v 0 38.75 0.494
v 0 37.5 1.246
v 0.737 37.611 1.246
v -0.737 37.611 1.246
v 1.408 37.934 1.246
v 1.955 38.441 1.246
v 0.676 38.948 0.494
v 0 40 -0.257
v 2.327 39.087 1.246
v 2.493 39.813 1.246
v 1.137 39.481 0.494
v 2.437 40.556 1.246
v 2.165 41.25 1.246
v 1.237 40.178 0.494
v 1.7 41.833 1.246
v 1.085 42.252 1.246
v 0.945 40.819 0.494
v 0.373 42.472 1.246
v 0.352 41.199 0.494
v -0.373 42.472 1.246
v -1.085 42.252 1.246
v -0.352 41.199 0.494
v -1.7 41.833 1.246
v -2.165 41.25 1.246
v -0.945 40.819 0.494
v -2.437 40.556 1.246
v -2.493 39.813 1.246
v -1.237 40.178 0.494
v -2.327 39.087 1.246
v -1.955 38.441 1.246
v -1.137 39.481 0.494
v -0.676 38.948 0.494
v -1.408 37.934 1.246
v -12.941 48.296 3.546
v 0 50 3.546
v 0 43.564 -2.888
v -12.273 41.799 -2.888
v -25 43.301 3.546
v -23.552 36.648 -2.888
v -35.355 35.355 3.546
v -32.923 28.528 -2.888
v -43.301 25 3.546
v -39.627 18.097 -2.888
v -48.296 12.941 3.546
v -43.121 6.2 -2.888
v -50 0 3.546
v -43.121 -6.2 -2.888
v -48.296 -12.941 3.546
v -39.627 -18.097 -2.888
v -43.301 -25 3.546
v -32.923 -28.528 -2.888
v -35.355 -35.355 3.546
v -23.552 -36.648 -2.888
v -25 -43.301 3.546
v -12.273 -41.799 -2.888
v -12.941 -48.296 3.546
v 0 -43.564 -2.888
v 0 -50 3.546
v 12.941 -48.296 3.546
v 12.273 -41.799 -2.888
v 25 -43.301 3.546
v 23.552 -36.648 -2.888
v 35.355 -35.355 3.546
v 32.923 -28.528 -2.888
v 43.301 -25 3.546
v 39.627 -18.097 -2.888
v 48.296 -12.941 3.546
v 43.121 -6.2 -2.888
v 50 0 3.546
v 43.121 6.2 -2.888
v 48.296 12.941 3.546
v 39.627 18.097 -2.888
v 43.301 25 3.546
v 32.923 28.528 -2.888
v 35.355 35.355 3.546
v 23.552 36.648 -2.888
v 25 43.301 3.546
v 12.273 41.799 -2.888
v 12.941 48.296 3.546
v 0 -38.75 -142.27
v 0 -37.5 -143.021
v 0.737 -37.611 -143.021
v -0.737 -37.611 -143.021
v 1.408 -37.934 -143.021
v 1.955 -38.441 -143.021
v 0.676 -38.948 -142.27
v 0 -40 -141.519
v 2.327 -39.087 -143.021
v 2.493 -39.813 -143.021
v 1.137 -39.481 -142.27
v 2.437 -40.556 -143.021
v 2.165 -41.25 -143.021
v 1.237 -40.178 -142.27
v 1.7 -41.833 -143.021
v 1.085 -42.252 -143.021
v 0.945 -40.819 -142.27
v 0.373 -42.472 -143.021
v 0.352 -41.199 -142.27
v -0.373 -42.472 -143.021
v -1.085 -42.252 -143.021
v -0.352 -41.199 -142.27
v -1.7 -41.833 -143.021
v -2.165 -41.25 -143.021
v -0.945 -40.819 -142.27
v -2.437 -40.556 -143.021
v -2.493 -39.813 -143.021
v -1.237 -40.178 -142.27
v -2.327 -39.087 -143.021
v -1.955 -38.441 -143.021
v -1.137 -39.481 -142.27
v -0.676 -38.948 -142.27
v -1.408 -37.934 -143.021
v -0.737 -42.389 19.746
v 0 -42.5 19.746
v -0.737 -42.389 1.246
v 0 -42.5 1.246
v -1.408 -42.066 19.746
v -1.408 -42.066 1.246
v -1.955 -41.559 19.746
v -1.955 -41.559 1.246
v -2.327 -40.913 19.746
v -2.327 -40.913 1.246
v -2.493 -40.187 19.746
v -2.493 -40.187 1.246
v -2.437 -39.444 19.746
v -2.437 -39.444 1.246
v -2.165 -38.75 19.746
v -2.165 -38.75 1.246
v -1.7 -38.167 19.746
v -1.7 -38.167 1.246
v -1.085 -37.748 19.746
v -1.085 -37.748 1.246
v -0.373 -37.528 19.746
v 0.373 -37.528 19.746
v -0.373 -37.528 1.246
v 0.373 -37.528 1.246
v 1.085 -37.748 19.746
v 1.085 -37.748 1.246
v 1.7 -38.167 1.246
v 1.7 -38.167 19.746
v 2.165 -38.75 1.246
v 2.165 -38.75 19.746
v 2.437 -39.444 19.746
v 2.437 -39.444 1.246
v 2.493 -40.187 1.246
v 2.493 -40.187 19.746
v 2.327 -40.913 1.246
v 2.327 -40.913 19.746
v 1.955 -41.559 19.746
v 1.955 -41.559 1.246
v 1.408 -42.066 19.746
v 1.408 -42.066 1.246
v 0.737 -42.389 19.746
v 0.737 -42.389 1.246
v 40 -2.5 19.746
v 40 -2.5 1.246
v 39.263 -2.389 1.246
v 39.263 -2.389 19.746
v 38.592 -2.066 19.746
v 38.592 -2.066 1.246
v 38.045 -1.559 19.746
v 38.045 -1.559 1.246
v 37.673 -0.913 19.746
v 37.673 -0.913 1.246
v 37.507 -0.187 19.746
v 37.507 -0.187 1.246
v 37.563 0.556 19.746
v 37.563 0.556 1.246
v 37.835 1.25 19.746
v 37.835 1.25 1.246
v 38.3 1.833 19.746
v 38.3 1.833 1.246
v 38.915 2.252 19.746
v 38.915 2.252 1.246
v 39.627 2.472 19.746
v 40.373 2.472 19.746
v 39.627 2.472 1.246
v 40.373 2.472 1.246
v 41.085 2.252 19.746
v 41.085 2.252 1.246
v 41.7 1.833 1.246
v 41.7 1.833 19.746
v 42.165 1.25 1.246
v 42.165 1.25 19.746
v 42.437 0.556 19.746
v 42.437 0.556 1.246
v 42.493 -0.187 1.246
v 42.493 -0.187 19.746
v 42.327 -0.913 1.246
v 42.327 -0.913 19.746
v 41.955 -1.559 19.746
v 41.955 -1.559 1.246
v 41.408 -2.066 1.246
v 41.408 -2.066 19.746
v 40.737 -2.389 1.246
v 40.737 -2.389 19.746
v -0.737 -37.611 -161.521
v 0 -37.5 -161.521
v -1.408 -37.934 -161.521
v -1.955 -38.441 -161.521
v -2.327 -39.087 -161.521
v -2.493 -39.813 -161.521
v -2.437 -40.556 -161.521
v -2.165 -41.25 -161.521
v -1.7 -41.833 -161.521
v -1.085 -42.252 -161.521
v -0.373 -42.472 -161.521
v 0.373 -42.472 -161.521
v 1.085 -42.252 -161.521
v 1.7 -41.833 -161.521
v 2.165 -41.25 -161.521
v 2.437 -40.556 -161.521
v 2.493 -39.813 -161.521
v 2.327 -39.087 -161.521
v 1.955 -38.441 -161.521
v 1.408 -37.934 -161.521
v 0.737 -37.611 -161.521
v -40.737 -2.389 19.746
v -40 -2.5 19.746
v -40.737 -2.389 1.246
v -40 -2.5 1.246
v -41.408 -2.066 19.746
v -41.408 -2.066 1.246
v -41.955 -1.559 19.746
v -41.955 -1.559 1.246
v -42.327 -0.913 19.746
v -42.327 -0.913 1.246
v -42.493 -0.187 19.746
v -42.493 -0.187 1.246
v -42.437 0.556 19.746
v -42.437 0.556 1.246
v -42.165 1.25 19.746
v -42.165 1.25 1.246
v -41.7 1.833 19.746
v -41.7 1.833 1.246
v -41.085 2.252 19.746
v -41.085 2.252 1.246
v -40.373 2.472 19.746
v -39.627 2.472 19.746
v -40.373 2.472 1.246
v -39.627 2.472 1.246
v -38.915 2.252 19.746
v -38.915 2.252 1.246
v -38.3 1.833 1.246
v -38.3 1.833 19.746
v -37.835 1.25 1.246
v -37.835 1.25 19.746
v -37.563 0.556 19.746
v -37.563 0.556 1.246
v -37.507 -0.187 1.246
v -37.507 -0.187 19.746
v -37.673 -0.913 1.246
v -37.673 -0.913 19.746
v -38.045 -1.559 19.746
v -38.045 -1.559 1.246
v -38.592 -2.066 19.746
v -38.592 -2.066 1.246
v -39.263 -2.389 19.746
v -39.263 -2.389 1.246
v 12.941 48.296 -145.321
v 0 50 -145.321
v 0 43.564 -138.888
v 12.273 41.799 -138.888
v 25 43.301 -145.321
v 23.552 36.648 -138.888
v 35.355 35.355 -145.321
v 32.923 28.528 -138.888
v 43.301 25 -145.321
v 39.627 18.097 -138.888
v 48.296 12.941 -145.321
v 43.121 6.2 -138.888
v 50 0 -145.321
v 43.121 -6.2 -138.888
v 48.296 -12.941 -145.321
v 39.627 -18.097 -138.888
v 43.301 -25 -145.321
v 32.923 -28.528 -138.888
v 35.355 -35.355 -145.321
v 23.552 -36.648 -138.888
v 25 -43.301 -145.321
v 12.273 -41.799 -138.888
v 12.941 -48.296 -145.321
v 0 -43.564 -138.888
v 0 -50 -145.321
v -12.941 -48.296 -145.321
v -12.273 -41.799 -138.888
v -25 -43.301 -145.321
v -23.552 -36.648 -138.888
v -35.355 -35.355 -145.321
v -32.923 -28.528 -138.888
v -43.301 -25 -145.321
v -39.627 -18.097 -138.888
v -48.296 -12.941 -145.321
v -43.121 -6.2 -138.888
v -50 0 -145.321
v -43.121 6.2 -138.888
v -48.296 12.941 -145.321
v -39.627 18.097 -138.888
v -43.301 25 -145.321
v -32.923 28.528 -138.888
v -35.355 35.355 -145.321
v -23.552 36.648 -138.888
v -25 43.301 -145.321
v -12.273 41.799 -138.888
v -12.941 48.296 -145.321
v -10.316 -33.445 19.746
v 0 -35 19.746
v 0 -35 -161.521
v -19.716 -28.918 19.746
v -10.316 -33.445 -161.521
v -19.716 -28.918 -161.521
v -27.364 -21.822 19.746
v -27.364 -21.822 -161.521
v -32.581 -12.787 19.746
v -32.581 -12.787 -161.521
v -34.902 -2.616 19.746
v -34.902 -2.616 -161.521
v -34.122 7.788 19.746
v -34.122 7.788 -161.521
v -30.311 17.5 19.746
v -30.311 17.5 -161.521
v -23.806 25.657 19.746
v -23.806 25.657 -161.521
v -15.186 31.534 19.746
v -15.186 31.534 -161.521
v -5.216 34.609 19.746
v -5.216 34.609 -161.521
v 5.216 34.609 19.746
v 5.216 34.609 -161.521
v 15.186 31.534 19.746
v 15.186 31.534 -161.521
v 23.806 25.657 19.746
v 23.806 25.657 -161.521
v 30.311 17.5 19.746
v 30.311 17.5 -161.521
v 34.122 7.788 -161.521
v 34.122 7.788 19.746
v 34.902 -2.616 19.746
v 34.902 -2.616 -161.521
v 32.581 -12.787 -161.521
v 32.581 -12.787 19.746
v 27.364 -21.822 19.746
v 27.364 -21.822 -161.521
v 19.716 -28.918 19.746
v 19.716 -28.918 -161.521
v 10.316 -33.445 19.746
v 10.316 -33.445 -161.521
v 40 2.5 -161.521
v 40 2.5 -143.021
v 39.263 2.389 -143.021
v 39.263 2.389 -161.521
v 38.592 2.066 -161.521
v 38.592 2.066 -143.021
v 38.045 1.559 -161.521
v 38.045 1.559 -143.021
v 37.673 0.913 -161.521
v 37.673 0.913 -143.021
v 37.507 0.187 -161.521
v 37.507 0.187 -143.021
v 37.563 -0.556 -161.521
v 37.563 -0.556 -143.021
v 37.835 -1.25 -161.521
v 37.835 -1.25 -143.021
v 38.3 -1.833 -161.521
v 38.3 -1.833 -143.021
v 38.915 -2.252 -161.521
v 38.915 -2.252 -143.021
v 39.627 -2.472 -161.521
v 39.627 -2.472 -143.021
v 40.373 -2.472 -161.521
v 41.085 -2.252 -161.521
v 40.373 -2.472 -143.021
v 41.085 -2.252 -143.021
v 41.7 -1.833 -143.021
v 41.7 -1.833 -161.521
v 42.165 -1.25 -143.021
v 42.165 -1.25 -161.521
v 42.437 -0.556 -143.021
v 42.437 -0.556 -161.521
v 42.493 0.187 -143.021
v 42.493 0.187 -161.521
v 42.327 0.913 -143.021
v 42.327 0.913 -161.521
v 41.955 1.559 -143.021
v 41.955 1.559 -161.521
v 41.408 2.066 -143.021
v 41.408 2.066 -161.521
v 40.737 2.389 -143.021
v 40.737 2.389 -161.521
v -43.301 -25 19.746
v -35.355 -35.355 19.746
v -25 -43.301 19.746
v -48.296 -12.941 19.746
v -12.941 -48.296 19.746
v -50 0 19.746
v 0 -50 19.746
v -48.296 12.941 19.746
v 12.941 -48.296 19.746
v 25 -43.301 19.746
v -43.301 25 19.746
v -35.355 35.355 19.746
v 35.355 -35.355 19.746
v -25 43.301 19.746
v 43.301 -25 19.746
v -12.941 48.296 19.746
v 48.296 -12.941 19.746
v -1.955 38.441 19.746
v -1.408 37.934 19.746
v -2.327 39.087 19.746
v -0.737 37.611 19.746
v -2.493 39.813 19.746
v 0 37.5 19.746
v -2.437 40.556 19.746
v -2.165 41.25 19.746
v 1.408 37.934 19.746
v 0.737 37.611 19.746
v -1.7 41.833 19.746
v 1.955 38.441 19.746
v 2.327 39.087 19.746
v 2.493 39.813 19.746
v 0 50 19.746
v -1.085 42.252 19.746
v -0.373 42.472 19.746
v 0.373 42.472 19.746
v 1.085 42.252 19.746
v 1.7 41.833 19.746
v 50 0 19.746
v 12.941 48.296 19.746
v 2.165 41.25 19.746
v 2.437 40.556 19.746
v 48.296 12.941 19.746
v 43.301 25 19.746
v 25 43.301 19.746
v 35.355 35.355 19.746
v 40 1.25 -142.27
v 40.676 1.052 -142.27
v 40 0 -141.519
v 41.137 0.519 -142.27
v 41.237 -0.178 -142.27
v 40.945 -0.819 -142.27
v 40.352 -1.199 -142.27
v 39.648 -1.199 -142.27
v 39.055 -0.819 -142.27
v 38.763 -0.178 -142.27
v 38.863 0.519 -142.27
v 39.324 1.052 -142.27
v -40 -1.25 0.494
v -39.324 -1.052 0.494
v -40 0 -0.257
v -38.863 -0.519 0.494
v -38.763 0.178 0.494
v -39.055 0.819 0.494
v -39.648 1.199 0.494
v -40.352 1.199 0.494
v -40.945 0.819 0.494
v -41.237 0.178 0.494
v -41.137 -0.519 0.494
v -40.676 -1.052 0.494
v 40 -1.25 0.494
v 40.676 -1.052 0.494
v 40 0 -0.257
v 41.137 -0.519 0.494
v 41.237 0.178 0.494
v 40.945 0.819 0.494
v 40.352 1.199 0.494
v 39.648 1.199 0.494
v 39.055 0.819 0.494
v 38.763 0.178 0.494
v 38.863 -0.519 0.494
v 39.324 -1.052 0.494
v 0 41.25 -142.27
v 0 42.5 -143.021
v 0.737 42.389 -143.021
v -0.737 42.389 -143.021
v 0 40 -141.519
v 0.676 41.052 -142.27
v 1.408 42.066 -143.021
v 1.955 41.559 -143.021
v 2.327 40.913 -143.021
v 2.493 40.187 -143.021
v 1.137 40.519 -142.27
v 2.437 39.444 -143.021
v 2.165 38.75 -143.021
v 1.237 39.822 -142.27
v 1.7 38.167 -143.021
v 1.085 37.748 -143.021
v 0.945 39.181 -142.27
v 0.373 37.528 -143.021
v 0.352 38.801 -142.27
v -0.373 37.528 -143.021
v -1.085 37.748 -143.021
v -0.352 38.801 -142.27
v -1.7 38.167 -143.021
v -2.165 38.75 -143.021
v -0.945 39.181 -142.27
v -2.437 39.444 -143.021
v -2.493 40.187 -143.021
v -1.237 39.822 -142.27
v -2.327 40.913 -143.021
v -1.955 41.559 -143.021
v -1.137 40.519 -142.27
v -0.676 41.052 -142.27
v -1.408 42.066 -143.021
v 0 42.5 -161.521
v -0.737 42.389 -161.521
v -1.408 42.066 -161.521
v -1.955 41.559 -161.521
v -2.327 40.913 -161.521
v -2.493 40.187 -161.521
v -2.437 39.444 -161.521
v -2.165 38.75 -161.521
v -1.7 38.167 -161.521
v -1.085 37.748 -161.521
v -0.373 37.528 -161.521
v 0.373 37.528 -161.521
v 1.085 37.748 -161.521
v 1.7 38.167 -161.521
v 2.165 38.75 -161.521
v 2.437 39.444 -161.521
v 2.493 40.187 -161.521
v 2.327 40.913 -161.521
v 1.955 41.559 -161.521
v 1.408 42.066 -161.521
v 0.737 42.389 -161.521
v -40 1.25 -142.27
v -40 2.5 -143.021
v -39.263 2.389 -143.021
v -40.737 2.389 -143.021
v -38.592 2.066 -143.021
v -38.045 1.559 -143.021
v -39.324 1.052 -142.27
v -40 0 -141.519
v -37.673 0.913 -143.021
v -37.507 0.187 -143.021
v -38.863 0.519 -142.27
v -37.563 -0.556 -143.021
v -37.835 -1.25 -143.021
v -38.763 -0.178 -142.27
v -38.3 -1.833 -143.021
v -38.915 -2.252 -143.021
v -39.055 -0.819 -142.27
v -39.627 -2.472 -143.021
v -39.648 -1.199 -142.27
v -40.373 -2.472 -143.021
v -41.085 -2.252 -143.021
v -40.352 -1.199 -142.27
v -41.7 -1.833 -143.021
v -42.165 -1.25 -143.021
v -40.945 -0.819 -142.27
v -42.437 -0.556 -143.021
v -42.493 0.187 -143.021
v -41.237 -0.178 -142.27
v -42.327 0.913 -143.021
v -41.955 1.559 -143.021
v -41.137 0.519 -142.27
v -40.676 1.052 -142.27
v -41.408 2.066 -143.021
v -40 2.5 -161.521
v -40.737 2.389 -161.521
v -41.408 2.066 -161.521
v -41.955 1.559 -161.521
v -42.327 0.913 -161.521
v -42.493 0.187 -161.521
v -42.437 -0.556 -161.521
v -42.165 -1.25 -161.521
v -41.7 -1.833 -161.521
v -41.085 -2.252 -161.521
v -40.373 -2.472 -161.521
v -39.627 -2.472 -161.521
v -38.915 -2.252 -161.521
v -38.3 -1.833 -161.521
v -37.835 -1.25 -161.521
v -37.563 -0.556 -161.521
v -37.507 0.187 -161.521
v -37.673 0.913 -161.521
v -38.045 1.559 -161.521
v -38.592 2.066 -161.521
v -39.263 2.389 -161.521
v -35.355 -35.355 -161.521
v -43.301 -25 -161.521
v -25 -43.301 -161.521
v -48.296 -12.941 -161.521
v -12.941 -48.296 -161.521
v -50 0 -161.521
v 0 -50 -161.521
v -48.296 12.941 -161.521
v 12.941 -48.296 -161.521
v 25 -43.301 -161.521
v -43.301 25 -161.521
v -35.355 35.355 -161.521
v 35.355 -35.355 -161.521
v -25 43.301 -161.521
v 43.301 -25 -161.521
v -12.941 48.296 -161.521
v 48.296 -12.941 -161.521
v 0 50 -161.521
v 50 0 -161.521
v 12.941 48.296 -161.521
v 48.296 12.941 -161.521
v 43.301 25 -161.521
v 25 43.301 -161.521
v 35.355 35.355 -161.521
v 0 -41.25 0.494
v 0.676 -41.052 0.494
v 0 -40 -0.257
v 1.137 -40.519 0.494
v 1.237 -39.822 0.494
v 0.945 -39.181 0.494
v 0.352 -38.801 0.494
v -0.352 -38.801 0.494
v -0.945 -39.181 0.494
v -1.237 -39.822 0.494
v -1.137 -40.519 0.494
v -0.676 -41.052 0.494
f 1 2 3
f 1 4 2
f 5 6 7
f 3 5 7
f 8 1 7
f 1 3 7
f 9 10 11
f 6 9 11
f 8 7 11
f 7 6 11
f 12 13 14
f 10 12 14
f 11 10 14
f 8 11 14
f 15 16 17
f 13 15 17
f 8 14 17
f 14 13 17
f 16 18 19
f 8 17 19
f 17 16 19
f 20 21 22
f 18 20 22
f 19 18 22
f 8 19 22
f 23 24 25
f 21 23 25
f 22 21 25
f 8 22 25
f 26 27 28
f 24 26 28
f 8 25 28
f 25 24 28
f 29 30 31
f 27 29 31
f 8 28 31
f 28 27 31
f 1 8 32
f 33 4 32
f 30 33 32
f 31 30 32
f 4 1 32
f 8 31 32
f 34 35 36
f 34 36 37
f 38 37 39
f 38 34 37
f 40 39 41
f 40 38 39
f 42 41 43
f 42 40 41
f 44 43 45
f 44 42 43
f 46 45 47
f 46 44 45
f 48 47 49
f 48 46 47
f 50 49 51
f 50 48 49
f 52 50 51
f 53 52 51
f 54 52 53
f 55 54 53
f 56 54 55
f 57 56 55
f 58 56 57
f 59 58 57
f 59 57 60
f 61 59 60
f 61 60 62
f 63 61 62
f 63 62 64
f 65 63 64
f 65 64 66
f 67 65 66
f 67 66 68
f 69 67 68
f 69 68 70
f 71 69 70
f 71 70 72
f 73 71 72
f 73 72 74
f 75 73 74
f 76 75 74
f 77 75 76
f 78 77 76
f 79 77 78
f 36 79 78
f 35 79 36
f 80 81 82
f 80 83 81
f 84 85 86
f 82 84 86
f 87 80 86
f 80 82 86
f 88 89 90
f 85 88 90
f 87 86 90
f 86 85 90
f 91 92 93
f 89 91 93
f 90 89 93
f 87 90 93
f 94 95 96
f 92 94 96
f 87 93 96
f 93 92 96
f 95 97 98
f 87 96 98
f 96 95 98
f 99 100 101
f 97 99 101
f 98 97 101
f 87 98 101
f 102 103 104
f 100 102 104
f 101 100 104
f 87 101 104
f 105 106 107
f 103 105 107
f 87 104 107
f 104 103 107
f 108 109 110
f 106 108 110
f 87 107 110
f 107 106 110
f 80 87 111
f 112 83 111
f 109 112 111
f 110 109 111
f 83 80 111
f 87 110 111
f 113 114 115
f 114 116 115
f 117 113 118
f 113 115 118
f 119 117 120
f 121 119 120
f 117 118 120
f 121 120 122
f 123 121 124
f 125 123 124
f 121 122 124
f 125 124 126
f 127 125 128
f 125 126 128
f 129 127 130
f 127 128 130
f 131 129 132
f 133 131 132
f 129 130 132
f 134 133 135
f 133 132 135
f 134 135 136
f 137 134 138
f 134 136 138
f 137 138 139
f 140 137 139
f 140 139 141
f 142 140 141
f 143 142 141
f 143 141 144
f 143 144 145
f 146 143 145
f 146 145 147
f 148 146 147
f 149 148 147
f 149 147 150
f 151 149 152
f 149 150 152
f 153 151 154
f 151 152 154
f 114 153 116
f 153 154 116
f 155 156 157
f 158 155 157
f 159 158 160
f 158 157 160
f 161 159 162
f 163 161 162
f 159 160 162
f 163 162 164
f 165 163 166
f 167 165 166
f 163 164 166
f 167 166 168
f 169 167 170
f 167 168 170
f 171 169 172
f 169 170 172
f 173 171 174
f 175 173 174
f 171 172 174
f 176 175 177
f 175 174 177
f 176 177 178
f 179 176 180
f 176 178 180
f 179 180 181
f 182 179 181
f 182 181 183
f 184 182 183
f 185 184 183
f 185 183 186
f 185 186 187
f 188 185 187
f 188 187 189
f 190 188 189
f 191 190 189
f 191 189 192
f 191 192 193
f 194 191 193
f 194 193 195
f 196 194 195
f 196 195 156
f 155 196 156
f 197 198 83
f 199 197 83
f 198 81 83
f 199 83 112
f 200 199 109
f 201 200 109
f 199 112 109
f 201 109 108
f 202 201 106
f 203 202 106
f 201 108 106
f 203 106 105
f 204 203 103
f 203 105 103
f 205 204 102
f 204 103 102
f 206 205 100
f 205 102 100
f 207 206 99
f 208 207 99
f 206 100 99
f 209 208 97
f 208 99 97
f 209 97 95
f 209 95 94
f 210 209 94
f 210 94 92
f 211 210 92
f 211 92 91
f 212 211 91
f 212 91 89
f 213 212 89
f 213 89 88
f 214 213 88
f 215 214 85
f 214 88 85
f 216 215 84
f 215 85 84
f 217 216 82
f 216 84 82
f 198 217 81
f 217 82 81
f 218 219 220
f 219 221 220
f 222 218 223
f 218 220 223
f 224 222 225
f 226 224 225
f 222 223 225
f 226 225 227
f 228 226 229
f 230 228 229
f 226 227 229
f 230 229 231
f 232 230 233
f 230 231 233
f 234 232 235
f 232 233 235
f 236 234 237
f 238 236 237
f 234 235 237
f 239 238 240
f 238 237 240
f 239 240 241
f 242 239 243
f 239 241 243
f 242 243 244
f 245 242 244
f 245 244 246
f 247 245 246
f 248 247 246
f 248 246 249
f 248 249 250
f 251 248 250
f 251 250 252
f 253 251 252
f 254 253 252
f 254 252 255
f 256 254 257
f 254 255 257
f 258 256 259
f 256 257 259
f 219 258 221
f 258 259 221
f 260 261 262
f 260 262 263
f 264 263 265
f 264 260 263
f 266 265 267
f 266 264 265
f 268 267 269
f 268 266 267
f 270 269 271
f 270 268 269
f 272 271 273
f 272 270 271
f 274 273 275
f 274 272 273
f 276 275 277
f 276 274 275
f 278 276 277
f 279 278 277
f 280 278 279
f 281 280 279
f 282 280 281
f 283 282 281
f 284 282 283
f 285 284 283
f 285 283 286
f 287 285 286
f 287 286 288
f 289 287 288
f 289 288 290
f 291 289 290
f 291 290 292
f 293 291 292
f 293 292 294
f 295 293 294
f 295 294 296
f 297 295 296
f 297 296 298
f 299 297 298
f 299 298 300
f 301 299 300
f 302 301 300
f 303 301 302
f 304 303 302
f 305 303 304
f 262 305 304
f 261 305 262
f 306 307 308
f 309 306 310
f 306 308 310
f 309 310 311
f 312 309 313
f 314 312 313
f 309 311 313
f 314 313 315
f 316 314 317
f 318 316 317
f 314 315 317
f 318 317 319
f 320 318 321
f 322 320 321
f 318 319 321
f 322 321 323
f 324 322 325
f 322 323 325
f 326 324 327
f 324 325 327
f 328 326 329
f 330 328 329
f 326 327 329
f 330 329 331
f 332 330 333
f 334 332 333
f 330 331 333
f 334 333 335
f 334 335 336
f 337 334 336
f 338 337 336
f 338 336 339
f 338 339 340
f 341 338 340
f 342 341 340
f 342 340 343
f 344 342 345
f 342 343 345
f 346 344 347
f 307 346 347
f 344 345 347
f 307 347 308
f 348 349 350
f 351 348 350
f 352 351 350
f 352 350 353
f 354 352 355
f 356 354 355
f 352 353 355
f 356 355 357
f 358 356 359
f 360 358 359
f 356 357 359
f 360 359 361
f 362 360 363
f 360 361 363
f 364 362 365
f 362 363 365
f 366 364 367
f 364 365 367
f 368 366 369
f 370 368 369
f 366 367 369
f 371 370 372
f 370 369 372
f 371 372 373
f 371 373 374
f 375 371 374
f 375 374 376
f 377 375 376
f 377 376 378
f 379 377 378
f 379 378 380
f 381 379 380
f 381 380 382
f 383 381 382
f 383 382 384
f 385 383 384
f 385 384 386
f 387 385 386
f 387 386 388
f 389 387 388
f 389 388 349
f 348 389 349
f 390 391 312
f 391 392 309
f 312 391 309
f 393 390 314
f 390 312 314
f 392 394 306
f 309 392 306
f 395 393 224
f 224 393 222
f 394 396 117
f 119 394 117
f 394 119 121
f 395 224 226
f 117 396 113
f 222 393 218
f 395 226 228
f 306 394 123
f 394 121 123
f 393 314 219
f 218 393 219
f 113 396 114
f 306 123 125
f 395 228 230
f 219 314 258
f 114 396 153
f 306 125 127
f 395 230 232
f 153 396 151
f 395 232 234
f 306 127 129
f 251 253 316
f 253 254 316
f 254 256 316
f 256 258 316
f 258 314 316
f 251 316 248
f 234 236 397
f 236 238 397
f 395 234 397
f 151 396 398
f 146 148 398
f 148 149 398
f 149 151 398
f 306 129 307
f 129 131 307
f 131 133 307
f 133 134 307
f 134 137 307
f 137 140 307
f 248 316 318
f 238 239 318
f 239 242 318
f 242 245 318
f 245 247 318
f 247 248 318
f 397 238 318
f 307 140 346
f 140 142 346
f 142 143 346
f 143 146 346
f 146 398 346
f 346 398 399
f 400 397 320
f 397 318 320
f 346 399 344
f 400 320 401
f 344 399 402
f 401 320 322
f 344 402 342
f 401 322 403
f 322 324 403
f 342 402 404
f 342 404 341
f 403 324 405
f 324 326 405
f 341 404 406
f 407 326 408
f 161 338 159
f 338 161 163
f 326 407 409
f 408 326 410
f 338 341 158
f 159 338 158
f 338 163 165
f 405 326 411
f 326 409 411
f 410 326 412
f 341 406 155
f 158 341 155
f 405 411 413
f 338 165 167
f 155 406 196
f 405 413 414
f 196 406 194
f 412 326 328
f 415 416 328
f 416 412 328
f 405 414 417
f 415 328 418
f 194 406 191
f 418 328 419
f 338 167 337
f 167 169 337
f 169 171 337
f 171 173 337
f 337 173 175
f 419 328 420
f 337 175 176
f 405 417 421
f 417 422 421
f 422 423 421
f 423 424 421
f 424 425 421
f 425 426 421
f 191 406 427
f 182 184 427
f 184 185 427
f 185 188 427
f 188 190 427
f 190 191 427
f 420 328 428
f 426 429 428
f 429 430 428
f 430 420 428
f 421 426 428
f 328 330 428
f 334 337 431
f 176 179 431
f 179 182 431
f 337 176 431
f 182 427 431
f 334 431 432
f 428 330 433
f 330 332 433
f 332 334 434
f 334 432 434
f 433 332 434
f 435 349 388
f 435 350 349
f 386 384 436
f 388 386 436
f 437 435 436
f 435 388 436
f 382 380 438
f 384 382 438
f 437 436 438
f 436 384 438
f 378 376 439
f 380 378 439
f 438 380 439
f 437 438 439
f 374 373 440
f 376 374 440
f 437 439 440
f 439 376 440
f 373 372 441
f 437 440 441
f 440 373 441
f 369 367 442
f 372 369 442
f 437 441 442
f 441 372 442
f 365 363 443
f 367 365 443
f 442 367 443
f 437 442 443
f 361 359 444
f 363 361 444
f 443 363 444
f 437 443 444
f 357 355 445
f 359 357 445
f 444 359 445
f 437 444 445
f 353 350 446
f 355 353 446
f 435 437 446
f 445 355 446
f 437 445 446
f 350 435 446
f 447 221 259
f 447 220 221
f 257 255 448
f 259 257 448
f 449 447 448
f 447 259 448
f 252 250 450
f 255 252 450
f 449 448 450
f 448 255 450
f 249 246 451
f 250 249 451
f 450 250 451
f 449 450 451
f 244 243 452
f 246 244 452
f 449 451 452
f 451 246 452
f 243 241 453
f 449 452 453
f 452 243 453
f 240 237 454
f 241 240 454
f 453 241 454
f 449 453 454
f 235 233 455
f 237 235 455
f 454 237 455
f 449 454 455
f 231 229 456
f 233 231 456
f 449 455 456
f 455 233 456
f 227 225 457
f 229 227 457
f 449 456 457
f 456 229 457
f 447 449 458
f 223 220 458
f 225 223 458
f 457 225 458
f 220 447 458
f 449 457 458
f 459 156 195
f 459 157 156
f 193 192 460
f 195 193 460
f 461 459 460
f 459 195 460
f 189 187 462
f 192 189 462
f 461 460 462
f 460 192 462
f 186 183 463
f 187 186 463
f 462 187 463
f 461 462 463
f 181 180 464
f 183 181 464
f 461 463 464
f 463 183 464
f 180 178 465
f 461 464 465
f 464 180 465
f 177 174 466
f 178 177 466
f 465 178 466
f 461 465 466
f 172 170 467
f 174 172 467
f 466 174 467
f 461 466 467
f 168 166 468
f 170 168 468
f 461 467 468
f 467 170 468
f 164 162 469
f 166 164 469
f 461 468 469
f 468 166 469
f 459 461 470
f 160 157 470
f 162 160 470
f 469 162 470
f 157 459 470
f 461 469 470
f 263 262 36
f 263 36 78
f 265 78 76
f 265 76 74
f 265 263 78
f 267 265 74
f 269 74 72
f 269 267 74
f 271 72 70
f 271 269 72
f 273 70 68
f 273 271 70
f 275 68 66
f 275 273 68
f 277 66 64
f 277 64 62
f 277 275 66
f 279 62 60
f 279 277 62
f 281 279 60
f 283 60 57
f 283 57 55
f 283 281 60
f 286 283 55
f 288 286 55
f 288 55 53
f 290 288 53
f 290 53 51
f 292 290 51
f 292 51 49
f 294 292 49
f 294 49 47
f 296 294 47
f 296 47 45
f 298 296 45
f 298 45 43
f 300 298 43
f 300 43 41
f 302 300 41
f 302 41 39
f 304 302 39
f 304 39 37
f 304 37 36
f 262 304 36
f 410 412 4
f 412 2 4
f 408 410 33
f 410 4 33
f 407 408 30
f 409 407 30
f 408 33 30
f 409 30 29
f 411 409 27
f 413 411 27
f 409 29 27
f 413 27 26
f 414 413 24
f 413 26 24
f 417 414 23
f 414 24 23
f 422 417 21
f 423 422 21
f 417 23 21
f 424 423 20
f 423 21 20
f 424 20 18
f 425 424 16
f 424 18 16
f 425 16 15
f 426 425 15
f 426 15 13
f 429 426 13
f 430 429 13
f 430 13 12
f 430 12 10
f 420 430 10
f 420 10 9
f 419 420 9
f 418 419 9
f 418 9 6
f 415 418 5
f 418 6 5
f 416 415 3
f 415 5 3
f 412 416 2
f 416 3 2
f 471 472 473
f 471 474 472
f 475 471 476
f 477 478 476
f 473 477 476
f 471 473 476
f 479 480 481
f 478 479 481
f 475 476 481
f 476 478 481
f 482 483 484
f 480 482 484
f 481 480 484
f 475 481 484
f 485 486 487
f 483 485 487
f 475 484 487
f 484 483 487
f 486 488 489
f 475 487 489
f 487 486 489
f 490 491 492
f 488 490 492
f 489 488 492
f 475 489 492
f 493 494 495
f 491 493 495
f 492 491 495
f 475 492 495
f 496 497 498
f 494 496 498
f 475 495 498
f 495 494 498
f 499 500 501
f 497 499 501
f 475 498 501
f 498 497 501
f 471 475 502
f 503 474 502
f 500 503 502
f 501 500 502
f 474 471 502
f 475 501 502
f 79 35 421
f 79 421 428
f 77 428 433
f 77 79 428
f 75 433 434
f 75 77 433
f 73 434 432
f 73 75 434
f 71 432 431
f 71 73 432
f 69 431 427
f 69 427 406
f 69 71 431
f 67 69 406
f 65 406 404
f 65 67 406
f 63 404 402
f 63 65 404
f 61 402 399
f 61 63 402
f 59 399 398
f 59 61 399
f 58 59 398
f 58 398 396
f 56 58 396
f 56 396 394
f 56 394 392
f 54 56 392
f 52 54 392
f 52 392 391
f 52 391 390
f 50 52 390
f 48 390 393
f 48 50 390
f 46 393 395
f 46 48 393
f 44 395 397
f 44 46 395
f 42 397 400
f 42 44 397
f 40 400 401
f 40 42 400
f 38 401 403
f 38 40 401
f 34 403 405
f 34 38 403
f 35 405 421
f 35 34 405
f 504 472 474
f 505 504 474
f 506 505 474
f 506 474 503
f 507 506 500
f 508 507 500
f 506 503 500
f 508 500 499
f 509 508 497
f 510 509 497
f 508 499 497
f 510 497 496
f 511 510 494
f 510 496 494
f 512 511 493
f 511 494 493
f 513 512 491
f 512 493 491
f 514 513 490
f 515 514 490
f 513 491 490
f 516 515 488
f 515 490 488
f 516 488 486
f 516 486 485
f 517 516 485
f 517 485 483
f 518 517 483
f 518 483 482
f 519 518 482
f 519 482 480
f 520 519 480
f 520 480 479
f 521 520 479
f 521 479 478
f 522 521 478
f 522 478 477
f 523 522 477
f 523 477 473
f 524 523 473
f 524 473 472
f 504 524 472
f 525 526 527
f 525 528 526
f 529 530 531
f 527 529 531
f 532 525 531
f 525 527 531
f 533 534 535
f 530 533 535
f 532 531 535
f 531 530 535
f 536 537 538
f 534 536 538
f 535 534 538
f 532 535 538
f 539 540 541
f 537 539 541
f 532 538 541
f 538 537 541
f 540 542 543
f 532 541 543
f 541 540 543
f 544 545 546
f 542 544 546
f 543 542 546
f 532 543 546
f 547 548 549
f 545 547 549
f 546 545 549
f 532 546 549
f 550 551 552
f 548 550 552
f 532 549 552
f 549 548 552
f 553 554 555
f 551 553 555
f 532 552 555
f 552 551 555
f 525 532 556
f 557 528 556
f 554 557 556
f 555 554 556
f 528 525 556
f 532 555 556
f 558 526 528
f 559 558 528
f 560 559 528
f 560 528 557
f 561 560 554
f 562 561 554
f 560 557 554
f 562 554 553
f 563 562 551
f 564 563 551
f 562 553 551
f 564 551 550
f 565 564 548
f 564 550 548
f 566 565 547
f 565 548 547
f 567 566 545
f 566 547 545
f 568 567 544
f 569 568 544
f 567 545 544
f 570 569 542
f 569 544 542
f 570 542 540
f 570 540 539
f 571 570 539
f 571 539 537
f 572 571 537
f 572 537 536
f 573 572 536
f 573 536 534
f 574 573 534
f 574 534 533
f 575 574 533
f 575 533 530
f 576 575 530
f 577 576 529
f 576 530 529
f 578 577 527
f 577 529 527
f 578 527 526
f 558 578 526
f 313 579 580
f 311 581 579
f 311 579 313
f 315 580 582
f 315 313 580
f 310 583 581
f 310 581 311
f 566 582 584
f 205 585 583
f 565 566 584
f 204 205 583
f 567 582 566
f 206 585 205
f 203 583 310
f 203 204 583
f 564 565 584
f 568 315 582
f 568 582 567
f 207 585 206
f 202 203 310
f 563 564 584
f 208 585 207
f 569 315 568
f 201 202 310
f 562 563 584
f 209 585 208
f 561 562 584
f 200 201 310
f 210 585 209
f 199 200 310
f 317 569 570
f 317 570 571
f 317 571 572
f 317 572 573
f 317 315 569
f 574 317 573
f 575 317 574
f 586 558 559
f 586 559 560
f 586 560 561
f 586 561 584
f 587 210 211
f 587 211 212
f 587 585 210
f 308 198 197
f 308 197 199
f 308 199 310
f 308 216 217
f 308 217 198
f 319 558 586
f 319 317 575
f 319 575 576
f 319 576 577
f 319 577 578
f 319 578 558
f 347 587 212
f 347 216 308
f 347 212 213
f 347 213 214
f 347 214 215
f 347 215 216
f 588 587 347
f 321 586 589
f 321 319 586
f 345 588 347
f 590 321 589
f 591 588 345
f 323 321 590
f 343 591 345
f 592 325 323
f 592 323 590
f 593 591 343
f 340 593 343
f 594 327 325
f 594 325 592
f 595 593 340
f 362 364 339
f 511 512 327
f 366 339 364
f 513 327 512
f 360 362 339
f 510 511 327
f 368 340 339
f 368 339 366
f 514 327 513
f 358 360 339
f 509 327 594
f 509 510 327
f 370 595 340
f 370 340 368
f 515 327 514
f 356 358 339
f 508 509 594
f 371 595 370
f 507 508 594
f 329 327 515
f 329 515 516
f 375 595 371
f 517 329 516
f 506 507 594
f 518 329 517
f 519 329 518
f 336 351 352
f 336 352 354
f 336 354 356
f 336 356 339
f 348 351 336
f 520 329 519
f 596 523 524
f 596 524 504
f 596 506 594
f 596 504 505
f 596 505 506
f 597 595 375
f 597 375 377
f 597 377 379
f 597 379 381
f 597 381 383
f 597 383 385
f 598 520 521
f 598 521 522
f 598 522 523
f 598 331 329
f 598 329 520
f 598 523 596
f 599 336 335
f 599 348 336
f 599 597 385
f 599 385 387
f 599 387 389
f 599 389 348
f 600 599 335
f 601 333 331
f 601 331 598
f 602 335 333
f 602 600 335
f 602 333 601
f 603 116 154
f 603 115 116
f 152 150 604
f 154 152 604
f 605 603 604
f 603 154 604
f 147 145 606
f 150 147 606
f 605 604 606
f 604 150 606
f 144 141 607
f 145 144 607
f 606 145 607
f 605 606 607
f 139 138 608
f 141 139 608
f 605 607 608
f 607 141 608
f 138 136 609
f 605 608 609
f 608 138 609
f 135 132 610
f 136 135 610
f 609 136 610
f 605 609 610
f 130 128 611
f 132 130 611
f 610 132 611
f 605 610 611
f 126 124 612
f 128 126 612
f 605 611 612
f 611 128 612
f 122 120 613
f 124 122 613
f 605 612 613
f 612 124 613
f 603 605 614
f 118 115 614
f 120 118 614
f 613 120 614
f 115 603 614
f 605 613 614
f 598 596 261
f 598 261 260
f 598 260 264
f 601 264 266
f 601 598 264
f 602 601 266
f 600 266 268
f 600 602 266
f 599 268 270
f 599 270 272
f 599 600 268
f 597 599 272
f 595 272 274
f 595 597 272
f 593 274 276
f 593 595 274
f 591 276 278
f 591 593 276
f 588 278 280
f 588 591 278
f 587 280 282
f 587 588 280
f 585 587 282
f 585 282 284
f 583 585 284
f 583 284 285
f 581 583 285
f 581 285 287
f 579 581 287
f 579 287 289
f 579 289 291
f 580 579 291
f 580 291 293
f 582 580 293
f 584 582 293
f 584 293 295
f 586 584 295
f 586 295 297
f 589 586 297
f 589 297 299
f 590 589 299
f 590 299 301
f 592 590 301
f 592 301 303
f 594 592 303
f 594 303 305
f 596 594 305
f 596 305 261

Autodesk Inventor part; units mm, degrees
ref_plane "YZ Plane" through (0, 0, 0) normal (1, 0, 0) x (0, 1, 0)
ref_plane "XZ Plane" through (0, 0, 0) normal (0, 1, 0) x (-1, 0, 0)
ref_plane "XY Plane" through (0, 0, 0) normal (0, 0, 1) x (1, 0, 0)
sketch "Szkic1" plane through (0, 0, 0) normal (1, 0, 0) x (0, 1, 0)
  point P0 (0, 0)
sketch "Szkic2" plane through (0, 0, 0) normal (1, 0, 0) x (0, 1, 0)
  point P0 (0, 0)
sketch "Szkic3" plane through (0, 0, 0) normal (1, 0, 0) x (0, 1, 0)
  line L0 (0, 19.7455) -> (50, 19.7455)
  line L1 (50, 19.7455) -> (50, 3.5455)
  line L2 (50, 3.5455) -> (43.564, -2.8878)
  line L3 (43.564, -2.8878) -> (43.564, -138.8878)
  line L4 (43.564, -138.8878) -> (50, -145.3212)
  line L5 (50, -145.3212) -> (50, -161.5212)
  line L6 (50, -161.5212) -> (0, -161.5212)
  line L7 (0, 19.7455) -> (0, -161.5212)
  point P0 (0, 0)
  dimension "d0" = 50
  dimension "d1" = 16.2
  dimension "d2" = 9.1
  dimension "d3" = 136
  dimension "d4" = 9.1
  dimension "d5" = 16.2
revolve "Obrót1" add sketch "Szkic3" angle 360 about axis through (0, 0, 19.7455) along (0, 0, -1)
sketch "Szkic4" plane through (0, 0, -161.5212) normal (0, 0, -1) x (-1, 0, 0)
  line L0 (0, 0) -> (40, 0)
  line L1 (0, 0) -> (0, -40)
  line L2 (0, 0) -> (-40, 0)
  line L3 (0, 0) -> (0, 40)
  dimension "d7" = 40
  dimension "d8" = 40
  dimension "d9" = 40
  dimension "d10" = 40
hole "Otwór1" at (0, 40, -161.5212) at (-40, 0, -161.5212) at (0, -40, -161.5212) at (40, 0, -161.5212) direction (0, 0, 1) diameter 5 depth 18.5 tip angle 118
sketch "Szkic5" plane through (0, 0, 19.7455) normal (0, 0, 1) x (1, 0, 0)
  circle A0 centre (40, 0) radius 2.5 projected
  line L0 (0, 0) -> (40, 0)
  circle A1 centre (0, -40) radius 2.5 projected
  line L1 (0, 0) -> (0, -40)
  circle A2 centre (0, 0) radius 50 projected
  circle A3 centre (-40, 0) radius 2.5 projected
  line L2 (0, 0) -> (-40, 0)
  circle A4 centre (0, 40) radius 2.5 projected
  line L3 (0, 0) -> (0, 40)
hole "Otwór2" at (-40, 0, 19.7455) at (0, 40, 19.7455) at (40, 0, 19.7455) at (0, -40, 19.7455) direction (0, 0, -1) diameter 5 depth 18.5 tip angle 118
sketch "Szkic6" plane through (0, 0, 19.7455) normal (0, 0, 1) x (1, 0, 0)
  line L0 (0, 0) -> (0, 50)
  circle A0 centre (0, 0) radius 50 projected
hole "Otwór3" at (0, 0, 19.7455) direction (0, 0, -1) diameter 70 end through all
sketch "Szkic7" plane through (0, 0, 19.7455) normal (0, 0, 1) x (1, 0, 0)
  point P0 (0, 0)
properties part number "korpus"
